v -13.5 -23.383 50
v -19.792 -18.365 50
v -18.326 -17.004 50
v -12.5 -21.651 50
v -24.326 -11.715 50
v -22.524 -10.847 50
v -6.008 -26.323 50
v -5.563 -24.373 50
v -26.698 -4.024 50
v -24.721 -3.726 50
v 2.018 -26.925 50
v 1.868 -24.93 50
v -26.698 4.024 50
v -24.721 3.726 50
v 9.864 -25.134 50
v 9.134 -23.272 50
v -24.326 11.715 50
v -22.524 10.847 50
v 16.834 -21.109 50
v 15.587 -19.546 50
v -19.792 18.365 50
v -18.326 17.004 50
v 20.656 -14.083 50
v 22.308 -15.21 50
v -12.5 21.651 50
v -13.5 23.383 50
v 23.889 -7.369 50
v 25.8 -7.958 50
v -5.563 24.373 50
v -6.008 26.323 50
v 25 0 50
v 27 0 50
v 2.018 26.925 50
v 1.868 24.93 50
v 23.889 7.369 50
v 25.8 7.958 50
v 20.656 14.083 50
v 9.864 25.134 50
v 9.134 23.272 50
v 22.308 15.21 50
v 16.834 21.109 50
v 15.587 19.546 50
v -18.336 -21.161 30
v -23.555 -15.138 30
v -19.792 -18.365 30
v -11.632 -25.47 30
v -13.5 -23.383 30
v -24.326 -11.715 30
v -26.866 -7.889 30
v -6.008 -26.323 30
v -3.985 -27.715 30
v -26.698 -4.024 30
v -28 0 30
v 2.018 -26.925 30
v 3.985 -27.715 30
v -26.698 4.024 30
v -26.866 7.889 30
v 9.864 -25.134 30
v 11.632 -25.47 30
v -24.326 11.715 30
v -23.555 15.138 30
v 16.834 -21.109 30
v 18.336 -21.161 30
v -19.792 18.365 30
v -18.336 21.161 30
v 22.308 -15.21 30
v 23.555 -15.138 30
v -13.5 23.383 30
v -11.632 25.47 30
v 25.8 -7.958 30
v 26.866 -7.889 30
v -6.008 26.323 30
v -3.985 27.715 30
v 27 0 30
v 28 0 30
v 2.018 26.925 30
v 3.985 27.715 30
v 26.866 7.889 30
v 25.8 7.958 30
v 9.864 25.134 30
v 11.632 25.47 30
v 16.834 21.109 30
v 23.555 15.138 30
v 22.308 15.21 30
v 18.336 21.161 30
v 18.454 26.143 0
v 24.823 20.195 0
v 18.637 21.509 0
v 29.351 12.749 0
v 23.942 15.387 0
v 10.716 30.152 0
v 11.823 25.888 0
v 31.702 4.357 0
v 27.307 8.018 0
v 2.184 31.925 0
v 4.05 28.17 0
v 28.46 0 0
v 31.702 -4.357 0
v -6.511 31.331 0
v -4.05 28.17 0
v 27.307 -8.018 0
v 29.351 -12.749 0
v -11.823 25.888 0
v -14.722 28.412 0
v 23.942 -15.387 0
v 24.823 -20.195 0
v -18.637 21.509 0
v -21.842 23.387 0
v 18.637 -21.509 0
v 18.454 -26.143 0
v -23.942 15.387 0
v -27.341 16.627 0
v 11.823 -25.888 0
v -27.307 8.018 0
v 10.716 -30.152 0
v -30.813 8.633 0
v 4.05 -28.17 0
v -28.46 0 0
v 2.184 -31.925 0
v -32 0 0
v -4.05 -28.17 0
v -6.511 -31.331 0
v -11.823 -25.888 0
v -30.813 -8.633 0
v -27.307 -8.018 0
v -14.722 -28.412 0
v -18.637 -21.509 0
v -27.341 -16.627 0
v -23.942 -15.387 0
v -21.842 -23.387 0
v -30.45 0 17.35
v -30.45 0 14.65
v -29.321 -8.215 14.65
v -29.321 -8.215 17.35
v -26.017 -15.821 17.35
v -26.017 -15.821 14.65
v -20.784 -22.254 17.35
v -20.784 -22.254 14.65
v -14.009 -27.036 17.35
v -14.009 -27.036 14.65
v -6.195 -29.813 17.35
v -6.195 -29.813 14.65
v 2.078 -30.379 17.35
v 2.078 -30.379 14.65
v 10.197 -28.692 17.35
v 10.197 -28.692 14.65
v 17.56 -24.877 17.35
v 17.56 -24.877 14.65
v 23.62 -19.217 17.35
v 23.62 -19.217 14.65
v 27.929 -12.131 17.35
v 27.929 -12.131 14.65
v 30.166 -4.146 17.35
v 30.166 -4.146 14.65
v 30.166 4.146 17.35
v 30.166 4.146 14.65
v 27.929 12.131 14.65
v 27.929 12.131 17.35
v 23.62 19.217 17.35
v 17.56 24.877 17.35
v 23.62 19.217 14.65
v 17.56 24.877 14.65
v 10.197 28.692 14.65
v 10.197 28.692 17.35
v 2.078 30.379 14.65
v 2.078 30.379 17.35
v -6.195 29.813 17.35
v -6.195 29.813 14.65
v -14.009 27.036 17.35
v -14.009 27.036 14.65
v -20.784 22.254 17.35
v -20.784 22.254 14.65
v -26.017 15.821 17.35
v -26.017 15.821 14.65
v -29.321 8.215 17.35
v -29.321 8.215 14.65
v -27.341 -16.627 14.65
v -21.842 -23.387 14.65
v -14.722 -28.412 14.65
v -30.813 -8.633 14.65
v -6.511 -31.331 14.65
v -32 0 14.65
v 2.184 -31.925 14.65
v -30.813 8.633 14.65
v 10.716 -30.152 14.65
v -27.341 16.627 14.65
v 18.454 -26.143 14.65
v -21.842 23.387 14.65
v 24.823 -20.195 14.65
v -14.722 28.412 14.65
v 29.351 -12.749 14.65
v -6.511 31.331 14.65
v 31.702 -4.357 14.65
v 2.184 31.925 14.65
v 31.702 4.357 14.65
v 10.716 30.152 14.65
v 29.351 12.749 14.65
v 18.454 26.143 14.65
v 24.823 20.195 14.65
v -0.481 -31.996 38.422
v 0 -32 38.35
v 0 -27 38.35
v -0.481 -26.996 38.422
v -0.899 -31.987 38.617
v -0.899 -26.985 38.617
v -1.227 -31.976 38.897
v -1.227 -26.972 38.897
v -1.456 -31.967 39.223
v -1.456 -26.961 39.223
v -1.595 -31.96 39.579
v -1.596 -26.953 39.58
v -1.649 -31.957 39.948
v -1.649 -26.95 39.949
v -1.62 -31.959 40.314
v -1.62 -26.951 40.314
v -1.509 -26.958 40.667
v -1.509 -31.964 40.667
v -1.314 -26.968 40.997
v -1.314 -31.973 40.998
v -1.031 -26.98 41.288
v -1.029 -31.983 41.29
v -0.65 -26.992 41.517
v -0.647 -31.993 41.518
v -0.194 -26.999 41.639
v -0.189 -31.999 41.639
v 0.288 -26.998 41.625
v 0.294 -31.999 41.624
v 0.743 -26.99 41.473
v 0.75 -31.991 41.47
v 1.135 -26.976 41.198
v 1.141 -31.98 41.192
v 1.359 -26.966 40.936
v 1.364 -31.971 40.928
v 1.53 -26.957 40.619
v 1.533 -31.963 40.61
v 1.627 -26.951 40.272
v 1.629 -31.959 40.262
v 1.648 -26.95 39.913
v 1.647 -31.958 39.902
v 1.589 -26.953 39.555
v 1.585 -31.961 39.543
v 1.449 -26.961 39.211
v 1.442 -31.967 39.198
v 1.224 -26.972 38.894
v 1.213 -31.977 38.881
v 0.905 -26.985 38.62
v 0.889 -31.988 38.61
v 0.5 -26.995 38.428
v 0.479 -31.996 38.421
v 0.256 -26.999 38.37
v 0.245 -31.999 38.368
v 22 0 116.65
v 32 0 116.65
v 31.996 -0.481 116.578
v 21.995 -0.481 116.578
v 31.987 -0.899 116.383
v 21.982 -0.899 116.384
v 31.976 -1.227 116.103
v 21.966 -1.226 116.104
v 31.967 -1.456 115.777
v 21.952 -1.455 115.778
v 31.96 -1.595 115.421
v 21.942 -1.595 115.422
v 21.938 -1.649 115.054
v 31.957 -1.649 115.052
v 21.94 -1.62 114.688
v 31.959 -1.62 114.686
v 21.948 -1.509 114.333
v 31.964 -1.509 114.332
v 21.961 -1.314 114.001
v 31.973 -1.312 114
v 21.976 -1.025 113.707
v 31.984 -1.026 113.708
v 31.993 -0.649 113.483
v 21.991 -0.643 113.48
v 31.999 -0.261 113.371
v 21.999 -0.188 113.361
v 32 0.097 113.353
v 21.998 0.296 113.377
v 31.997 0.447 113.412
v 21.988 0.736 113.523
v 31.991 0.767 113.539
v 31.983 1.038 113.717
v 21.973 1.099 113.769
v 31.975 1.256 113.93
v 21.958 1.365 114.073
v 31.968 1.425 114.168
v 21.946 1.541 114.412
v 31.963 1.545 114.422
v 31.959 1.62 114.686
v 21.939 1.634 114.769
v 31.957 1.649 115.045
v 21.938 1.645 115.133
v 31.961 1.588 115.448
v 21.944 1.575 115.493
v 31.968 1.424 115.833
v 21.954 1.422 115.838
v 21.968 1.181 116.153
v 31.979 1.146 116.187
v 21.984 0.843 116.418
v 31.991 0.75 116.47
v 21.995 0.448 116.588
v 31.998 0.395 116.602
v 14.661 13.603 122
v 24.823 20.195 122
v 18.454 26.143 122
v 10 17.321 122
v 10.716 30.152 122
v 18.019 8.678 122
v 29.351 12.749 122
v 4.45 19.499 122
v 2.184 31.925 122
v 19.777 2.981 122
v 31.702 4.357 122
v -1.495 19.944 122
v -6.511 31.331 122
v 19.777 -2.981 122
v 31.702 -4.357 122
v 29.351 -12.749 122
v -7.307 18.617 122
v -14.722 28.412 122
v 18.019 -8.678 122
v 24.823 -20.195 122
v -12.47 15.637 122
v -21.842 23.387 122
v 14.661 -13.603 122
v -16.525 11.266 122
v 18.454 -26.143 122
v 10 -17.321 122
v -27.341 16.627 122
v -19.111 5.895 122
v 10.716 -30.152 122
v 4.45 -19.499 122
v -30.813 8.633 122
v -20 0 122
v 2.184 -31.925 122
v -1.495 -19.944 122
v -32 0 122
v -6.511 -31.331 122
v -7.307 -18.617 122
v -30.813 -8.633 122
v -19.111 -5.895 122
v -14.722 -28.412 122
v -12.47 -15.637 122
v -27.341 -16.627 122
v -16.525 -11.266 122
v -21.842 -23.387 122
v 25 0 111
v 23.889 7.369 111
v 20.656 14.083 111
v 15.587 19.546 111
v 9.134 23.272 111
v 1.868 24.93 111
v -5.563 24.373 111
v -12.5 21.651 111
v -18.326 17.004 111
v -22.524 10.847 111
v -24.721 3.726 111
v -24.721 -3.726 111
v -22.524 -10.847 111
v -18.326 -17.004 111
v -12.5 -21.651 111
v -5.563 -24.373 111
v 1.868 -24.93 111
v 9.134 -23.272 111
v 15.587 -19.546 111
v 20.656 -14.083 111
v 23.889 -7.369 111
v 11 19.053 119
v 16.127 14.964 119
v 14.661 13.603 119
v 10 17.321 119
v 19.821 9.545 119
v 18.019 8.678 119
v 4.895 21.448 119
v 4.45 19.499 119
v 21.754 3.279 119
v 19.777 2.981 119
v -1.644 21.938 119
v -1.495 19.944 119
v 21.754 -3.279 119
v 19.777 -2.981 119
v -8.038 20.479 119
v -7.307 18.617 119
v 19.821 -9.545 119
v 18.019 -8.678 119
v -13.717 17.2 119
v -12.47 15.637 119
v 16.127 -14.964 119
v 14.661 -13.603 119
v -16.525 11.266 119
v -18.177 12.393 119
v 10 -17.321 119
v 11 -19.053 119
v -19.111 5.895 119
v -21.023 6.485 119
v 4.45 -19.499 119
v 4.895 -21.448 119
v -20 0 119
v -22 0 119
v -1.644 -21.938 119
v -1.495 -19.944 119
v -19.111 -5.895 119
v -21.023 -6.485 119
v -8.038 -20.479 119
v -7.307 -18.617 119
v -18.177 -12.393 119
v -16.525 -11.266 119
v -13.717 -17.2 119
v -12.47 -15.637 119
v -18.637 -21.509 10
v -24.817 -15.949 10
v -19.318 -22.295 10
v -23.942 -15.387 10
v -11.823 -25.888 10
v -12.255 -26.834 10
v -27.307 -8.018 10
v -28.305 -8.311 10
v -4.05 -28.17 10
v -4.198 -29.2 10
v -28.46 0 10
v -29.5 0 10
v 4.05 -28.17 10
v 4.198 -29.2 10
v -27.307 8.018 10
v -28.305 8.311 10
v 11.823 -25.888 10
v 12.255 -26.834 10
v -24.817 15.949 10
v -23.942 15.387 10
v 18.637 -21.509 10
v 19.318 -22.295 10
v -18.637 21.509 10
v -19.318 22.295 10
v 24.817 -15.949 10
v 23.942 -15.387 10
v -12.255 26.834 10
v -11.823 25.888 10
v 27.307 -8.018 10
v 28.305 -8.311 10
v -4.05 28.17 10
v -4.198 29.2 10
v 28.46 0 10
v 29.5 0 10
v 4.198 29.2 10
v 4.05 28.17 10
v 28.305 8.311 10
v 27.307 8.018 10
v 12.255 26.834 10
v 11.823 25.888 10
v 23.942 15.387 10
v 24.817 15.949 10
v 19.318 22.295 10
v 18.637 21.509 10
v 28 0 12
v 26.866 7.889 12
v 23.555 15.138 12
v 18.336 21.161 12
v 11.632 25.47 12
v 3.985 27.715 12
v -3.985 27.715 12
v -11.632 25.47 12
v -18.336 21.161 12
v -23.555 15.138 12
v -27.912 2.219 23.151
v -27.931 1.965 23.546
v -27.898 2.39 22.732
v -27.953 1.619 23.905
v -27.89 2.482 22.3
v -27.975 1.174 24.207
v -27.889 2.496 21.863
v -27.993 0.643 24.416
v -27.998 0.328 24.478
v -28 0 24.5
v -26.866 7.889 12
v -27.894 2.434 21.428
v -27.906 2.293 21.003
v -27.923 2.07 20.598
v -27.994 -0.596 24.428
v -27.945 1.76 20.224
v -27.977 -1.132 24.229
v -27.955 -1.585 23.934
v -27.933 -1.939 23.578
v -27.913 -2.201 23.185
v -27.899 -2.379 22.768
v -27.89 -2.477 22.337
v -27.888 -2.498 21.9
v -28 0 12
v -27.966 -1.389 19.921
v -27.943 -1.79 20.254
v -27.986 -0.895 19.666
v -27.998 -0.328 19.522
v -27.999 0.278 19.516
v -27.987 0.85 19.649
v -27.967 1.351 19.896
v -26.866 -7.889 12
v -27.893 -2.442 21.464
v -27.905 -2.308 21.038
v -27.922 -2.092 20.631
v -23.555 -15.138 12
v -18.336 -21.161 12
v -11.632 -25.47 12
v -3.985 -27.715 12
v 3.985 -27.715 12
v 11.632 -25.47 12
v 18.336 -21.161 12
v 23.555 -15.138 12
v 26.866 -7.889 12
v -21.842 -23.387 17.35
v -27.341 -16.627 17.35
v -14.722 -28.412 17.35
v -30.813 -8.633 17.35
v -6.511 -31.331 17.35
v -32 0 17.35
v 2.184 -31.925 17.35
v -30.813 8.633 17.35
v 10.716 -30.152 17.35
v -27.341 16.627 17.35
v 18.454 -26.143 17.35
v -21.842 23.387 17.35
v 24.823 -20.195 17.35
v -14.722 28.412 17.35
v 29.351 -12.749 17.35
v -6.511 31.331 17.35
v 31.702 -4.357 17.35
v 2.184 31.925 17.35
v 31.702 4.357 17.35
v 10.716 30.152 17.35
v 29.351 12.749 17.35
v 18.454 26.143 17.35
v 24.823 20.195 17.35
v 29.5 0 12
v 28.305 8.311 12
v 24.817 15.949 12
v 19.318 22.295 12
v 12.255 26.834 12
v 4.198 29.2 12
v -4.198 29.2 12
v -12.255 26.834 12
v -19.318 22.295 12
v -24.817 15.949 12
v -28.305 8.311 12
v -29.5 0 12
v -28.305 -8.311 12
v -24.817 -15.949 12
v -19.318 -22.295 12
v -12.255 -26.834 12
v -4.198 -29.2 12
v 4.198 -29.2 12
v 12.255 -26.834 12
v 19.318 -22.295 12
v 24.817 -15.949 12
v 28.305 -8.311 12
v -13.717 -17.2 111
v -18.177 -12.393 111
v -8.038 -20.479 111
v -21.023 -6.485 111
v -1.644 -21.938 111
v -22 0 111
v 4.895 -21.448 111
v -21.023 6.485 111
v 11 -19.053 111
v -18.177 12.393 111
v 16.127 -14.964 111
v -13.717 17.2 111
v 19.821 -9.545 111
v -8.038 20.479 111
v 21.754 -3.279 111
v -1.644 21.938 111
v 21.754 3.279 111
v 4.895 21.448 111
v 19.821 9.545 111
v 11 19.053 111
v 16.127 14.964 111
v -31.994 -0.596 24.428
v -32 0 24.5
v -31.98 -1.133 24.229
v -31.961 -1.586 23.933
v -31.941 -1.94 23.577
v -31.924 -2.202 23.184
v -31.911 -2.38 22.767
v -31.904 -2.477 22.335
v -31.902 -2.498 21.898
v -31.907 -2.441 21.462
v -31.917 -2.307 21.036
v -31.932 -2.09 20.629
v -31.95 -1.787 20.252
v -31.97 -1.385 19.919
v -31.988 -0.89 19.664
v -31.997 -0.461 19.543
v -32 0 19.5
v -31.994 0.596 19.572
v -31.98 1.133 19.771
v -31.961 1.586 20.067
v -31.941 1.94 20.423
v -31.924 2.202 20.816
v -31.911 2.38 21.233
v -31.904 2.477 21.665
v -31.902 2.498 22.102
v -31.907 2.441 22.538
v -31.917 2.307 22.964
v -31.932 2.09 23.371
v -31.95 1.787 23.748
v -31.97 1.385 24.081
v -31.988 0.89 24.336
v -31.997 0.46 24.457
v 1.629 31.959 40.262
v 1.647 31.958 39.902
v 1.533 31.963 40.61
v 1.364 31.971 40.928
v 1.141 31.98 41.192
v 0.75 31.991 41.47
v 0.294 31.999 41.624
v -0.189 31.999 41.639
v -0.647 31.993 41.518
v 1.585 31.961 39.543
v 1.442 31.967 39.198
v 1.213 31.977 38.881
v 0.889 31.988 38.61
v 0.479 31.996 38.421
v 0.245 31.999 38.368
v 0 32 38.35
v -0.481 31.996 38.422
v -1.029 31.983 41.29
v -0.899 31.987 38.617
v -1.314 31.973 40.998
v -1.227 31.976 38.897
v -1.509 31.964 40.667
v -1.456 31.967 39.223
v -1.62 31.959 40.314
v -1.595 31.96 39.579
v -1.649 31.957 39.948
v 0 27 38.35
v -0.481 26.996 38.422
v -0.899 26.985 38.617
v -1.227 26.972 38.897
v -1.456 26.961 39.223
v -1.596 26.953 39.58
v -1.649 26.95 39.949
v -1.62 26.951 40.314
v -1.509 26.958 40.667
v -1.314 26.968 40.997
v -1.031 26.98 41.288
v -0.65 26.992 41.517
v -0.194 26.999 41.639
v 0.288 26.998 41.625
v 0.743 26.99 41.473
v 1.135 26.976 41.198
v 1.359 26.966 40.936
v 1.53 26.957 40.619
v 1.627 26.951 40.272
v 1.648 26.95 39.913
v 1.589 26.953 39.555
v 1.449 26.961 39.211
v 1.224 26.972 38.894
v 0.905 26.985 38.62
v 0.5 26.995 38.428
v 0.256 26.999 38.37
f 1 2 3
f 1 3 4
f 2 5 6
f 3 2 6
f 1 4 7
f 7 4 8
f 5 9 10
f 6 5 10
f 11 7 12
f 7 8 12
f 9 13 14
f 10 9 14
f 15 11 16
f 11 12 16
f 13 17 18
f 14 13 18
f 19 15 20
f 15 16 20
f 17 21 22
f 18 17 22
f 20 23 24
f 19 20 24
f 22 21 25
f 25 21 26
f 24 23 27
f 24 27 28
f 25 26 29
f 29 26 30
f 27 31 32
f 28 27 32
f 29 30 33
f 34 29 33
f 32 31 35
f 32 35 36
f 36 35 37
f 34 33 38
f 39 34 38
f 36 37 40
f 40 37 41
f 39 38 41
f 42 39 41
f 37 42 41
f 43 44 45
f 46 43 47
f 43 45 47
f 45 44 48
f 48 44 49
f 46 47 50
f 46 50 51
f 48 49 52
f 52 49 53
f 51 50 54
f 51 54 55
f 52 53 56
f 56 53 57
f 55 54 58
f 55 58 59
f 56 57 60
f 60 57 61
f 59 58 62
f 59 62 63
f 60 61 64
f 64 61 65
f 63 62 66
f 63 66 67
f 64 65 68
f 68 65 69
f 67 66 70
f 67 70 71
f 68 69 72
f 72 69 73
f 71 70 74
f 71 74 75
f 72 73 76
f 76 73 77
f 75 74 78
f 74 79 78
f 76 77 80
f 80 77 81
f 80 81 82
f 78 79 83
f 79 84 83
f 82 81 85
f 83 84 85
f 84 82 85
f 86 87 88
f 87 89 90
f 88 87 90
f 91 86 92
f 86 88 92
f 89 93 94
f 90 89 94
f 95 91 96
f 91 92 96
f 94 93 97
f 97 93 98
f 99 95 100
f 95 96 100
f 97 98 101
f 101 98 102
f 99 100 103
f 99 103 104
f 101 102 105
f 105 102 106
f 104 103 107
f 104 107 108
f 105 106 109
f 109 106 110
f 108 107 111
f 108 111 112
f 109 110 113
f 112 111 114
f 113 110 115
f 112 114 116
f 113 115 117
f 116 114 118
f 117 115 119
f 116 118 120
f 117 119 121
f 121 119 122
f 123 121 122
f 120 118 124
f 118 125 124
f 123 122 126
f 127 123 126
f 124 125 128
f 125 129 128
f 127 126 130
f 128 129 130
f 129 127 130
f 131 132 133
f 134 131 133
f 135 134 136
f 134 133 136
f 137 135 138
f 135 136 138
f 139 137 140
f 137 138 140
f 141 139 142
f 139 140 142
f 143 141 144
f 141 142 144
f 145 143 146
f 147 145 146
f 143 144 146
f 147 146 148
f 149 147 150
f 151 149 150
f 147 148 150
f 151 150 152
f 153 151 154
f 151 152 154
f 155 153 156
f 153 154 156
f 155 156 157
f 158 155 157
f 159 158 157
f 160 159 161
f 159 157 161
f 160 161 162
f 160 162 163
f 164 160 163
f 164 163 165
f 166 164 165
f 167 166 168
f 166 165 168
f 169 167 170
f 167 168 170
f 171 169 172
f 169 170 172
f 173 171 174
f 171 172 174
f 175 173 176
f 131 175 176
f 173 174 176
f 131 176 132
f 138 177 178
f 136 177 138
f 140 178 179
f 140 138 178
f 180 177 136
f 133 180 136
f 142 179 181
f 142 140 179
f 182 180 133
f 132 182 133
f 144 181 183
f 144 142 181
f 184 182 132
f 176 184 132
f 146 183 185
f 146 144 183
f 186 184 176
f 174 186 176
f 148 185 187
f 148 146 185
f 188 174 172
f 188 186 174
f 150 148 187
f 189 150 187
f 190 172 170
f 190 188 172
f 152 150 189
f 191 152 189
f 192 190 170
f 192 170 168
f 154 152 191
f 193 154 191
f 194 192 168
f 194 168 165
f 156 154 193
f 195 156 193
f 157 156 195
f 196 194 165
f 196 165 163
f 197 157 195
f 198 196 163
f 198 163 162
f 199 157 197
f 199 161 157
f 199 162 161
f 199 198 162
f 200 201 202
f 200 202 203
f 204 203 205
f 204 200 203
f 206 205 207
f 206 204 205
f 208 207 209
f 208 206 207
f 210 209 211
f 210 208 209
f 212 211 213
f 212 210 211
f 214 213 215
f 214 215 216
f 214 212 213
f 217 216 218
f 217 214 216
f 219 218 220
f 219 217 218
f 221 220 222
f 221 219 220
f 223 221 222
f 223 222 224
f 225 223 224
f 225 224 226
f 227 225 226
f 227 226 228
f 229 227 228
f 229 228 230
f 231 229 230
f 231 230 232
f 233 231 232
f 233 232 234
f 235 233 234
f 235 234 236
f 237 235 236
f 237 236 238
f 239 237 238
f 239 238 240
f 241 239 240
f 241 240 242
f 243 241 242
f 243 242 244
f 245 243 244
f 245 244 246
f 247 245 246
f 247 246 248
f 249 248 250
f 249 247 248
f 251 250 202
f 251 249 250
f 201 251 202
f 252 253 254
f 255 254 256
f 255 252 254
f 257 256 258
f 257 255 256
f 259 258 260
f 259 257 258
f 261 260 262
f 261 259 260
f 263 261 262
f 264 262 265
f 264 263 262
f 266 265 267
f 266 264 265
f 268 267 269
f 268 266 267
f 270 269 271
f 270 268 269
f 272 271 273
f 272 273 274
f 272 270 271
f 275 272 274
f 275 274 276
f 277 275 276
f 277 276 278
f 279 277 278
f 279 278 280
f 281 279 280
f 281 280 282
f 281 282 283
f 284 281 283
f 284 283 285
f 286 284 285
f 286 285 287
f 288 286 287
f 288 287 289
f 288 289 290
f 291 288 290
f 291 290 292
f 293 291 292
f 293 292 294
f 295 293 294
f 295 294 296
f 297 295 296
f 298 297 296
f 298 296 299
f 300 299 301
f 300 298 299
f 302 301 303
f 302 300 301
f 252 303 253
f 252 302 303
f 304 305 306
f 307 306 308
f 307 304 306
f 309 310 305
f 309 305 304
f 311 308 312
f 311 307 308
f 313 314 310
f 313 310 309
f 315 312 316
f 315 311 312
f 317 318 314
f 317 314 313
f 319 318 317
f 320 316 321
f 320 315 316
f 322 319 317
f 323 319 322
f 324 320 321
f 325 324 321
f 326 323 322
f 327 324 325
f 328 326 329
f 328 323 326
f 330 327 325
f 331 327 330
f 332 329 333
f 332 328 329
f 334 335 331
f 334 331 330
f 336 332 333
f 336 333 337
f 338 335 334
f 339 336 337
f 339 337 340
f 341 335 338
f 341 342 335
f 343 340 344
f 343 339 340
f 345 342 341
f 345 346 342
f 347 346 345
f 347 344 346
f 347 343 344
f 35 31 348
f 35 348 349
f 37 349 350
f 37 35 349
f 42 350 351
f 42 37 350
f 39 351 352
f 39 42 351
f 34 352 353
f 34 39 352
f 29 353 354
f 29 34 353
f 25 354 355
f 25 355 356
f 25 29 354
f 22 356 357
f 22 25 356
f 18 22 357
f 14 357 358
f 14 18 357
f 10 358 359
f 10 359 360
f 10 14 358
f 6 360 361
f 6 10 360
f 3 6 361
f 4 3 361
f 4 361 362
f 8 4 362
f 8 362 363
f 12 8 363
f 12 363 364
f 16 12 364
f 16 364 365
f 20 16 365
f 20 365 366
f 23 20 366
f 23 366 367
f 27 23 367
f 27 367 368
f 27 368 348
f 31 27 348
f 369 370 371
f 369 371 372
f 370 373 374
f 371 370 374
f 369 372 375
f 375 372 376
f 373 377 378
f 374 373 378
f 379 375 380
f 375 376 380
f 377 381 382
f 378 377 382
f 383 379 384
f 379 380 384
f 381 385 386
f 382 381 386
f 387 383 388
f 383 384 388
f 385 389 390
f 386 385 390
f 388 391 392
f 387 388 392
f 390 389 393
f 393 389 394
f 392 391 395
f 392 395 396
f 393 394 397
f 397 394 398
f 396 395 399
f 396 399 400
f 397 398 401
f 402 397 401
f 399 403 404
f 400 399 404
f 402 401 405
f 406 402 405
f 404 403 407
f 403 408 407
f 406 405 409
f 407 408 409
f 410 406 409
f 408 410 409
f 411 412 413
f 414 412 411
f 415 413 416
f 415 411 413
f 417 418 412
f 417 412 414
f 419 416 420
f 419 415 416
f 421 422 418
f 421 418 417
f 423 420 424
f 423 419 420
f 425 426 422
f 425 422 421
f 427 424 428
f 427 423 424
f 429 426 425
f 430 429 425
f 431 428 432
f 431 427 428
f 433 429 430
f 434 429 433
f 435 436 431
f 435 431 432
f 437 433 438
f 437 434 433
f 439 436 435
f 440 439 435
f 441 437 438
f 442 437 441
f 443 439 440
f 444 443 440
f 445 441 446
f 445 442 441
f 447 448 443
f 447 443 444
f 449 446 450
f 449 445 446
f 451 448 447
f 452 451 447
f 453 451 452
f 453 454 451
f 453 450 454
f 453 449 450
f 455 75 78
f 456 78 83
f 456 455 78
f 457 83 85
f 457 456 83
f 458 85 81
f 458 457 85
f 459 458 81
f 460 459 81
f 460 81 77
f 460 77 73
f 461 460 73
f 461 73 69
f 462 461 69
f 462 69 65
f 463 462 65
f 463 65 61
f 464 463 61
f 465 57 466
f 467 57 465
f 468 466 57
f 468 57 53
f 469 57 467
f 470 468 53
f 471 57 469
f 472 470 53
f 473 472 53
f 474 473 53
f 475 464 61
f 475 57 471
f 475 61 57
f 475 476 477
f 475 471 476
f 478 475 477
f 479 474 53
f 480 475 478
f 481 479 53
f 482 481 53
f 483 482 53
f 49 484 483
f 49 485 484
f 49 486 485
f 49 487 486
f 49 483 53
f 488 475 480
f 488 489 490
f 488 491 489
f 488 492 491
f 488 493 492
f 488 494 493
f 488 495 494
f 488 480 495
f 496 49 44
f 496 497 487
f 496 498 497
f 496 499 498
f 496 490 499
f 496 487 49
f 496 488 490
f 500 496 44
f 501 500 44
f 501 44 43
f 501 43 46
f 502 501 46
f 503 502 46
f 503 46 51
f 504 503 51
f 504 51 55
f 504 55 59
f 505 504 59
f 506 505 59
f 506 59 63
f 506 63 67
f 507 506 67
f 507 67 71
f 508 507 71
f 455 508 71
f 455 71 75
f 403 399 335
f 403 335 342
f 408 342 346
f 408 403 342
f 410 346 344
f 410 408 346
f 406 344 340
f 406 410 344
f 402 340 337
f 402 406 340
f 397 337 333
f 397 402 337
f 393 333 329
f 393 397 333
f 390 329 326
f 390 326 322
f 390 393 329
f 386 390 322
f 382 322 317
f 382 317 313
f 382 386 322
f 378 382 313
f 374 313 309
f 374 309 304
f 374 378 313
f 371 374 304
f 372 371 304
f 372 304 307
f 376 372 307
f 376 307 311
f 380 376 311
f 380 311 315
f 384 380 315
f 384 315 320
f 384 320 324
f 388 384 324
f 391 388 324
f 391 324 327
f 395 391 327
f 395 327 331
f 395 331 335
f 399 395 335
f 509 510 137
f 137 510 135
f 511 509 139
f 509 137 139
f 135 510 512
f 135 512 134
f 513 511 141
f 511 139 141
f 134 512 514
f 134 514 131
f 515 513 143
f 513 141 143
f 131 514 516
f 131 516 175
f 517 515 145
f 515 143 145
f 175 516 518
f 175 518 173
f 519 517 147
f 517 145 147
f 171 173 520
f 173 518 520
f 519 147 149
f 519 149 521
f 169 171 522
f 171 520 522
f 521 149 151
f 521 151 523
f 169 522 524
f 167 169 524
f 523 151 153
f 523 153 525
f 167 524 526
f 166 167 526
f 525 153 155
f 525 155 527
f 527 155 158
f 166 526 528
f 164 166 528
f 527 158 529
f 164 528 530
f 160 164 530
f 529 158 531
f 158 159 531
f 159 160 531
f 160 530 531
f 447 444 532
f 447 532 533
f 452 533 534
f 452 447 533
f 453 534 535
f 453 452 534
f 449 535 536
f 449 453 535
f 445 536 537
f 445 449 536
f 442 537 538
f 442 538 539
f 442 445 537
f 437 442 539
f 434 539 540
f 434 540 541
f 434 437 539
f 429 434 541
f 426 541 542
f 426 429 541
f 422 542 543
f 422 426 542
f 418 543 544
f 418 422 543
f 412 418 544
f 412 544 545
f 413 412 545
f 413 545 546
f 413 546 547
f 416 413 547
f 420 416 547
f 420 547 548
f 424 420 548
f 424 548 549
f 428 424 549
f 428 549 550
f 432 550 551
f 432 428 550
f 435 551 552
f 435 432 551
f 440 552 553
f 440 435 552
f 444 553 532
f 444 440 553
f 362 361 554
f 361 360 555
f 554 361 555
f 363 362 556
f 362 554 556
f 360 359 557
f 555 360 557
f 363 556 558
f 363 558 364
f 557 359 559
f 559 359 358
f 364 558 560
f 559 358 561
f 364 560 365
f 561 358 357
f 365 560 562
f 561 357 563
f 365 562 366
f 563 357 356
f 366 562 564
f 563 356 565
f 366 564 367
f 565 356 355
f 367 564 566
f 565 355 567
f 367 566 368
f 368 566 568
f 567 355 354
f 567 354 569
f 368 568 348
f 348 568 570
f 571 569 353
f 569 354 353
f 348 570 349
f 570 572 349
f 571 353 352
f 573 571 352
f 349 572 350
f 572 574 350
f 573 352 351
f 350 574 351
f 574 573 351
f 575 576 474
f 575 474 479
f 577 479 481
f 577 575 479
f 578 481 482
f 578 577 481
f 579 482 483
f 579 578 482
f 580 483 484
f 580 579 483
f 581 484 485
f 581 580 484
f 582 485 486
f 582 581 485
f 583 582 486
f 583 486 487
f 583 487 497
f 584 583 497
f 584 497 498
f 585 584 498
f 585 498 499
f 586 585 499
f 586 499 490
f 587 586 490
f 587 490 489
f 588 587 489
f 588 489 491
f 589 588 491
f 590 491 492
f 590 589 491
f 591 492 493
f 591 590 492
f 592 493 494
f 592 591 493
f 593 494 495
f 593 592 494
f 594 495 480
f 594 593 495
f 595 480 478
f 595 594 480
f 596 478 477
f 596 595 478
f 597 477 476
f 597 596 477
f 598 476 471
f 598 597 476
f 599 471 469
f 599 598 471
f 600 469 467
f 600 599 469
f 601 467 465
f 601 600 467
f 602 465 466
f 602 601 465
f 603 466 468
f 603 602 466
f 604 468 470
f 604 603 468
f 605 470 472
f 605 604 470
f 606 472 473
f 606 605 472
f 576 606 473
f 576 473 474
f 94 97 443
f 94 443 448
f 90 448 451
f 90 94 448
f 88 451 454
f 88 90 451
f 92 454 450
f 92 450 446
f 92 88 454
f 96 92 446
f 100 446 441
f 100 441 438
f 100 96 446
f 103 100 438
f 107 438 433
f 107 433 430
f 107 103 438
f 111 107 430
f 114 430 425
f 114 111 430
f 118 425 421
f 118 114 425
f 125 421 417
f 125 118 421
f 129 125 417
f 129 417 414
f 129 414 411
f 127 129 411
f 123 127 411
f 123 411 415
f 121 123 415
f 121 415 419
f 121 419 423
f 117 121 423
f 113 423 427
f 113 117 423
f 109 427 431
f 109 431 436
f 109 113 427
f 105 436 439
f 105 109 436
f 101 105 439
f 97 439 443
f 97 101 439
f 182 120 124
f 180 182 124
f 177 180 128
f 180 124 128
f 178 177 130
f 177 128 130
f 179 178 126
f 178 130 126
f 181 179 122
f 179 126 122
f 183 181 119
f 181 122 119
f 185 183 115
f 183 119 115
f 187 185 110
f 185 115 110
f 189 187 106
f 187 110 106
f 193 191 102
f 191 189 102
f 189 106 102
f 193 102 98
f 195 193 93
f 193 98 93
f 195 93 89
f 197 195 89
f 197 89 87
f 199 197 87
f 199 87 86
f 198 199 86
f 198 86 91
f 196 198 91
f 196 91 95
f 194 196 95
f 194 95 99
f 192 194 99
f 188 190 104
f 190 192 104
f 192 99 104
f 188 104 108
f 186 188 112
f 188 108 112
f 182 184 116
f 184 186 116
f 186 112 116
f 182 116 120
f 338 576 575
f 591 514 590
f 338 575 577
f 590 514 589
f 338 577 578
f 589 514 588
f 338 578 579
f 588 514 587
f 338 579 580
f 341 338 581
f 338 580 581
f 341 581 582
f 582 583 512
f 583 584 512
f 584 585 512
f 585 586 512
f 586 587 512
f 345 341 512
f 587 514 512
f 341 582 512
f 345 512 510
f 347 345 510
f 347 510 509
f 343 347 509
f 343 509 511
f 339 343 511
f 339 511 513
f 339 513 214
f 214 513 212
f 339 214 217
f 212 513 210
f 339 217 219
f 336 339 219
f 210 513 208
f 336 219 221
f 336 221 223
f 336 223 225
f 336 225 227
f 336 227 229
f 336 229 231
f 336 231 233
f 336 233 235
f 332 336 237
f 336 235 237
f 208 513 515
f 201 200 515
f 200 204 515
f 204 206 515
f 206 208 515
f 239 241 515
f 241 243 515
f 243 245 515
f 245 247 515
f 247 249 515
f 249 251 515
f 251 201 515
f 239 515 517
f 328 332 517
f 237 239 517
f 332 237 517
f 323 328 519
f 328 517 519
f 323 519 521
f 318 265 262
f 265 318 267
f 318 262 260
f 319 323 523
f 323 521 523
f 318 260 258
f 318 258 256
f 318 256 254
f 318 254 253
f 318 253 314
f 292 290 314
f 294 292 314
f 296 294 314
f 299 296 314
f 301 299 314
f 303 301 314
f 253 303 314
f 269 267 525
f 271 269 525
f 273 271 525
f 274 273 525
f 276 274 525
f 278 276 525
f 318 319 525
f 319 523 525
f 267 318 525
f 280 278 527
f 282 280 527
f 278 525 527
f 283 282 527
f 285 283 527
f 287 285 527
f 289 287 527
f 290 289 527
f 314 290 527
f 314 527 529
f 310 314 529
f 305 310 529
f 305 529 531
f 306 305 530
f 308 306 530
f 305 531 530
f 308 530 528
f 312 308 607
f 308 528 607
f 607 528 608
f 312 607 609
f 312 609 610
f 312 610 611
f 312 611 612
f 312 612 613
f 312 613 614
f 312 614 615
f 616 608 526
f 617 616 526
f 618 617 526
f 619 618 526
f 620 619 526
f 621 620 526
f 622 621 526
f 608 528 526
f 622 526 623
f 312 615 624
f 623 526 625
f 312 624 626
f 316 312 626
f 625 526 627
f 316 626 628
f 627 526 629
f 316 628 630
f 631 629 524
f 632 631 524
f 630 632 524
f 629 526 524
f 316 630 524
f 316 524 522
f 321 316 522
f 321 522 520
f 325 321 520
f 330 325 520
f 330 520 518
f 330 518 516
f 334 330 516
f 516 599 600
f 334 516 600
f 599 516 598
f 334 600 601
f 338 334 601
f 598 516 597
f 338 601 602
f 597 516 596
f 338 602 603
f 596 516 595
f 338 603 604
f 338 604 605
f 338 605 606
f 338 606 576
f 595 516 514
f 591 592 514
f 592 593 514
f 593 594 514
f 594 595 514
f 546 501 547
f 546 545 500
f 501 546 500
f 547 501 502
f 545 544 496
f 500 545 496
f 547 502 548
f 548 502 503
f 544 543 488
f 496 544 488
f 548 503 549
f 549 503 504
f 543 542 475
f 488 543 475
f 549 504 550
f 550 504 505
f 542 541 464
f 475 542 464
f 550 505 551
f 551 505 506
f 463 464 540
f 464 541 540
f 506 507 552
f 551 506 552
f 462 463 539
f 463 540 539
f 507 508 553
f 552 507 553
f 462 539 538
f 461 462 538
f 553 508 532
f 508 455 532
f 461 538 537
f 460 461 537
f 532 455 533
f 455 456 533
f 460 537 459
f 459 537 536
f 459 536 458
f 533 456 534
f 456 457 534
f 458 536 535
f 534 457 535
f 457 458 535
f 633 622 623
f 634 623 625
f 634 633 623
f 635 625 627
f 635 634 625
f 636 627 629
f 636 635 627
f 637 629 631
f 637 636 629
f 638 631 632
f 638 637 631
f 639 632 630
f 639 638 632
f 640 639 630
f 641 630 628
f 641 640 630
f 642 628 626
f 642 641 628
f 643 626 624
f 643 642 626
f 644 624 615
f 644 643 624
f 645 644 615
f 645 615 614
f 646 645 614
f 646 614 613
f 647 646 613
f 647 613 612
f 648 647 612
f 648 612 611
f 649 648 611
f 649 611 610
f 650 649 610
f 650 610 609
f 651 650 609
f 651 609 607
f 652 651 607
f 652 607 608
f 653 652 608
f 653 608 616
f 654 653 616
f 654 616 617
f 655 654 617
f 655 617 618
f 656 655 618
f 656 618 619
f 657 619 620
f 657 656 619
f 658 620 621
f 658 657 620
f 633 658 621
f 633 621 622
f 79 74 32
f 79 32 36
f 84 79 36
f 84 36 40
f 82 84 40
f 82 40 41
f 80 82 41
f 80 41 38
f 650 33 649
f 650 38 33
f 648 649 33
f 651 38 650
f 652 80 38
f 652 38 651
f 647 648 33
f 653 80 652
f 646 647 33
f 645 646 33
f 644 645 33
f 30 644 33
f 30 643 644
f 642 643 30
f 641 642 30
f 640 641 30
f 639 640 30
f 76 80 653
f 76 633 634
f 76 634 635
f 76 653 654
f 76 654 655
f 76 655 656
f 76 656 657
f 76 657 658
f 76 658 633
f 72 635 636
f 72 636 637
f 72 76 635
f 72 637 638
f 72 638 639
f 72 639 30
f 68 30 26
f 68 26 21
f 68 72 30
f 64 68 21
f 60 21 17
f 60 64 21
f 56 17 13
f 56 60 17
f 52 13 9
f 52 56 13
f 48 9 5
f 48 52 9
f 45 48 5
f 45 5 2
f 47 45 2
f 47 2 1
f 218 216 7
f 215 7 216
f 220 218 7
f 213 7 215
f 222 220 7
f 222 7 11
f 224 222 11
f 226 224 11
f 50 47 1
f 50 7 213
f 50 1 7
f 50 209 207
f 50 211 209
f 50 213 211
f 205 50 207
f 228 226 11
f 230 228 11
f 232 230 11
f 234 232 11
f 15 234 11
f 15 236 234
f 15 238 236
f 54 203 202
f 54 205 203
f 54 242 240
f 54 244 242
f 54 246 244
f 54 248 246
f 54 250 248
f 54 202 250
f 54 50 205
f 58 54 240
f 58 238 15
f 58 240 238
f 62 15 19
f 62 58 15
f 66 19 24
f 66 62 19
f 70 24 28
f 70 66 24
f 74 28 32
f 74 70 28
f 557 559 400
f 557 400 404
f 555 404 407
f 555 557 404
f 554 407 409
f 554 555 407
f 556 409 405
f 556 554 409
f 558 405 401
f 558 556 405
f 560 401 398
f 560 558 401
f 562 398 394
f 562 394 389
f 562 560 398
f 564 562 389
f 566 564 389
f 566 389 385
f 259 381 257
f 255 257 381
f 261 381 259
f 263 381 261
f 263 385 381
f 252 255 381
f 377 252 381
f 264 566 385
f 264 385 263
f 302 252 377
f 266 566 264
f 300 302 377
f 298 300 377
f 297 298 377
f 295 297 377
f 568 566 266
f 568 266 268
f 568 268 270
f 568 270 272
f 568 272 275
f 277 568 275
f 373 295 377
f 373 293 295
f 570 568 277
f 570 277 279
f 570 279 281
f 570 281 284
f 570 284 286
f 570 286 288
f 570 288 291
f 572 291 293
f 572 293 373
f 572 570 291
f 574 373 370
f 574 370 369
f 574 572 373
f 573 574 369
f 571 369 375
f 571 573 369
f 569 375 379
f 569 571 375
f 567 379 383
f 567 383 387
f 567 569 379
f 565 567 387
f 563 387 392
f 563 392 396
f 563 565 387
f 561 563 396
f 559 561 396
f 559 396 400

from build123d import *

# Parameters (mm, degrees)
SKETCH1_R            = 32
BODY_DEPTH           = 122
SKETCH2_R            = 20
LIP_BORE_DEPTH       = 122
SKETCH3_R            = 22
BRIDGE_SEAT_DEPTH    = 119
SKETCH4_R            = 25
HOPPER_DEPTH         = 111
SKETCH5_R            = 27
BURR_SEAT_DEPTH      = 50
SKETCH6_R            = 28
PILOT_SEAT_DEPTH     = 30
SKETCH7_R            = 28.46
THREAD_MINOR_DEPTH   = 10
SKETCH8_R            = 29.5
THREAD_RELIEF_DEPTH  = 2
SKETCH9_R            = 33
SKETCH9_R_2          = 30.45
ORING_GROOVE_DEPTH   = 2.7
SKETCH10_R           = 1.65
BURR_SCREW_90_DEPTH  = 6
SKETCH11_R           = 1.65
BURR_SCREW_270_DEPTH = 6
SKETCH12_R           = 1.65
BRIDGE_SCREW_DEPTH   = 11
SKETCH13_R           = 2.5
PLUNGER_HOLE_DEPTH   = 5


with BuildPart() as part:
    # Sketch1 → Body (new body)
    with BuildSketch(Plane.XY):
        with Locations(Location((0, 0, 0), (0, 0, 180))):
            Circle(SKETCH1_R)
    extrude(amount=BODY_DEPTH)

    # Sketch2 → Lip_bore (cut)
    with BuildSketch(Plane.XY):
        with Locations(Location((0, 0, 0), (0, 0, 180))):
            Circle(SKETCH2_R)
    extrude(amount=LIP_BORE_DEPTH, mode=Mode.SUBTRACT)

    # Sketch3 → Bridge_seat (cut)
    with BuildSketch(Plane.XY):
        with Locations(Location((0, 0, 0), (0, 0, 180))):
            Circle(SKETCH3_R)
    extrude(amount=BRIDGE_SEAT_DEPTH, mode=Mode.SUBTRACT)

    # Sketch4 → Hopper (cut)
    with BuildSketch(Plane.XY):
        Circle(SKETCH4_R)
    extrude(amount=HOPPER_DEPTH, mode=Mode.SUBTRACT)

    # Sketch5 → Burr_seat (cut)
    with BuildSketch(Plane.XY):
        Circle(SKETCH5_R)
    extrude(amount=BURR_SEAT_DEPTH, mode=Mode.SUBTRACT)

    # Sketch6 → Pilot_seat (cut)
    with BuildSketch(Plane.XY):
        Circle(SKETCH6_R)
    extrude(amount=PILOT_SEAT_DEPTH, mode=Mode.SUBTRACT)

    # Sketch7 → Thread_minor (cut)
    with BuildSketch(Plane.XY):
        Circle(SKETCH7_R)
    extrude(amount=THREAD_MINOR_DEPTH, mode=Mode.SUBTRACT)

    # Sketch8 → Thread_relief (cut)
    with BuildSketch(Plane.XY.offset(10)):
        Circle(SKETCH8_R)
    extrude(amount=THREAD_RELIEF_DEPTH, mode=Mode.SUBTRACT)

    # Sketch9 → Oring_groove (cut)
    with BuildSketch(Plane.XY.offset(14.65)):
        Circle(SKETCH9_R)
        with Locations(Location((0, 0, 0), (0, 0, 180))):
            Circle(SKETCH9_R_2, mode=Mode.SUBTRACT)
    extrude(amount=ORING_GROOVE_DEPTH, mode=Mode.SUBTRACT)

    # Sketch10 → Burr_screw_90 (cut)
    with BuildSketch(Plane(origin=(0, 26.5, 0), x_dir=(1, 0, 0), z_dir=(0, 1, 0))):
        with Locations(Location((0, -40, 0), (0, 0, 90))):
            Circle(SKETCH10_R)
    extrude(amount=BURR_SCREW_90_DEPTH, mode=Mode.SUBTRACT)

    # Sketch11 → Burr_screw_270 (cut)
    with BuildSketch(Plane(origin=(0, -32.5, 0), x_dir=(1, 0, 0), z_dir=(0, 1, 0))):
        with Locations(Location((0, -40, 0), (0, 0, 90))):
            Circle(SKETCH11_R)
    extrude(amount=BURR_SCREW_270_DEPTH, mode=Mode.SUBTRACT)

    # Sketch12 → Bridge_screw (cut)
    with BuildSketch(Plane(origin=(21.5, 0, 0), x_dir=(0, 0, -1), z_dir=(1, 0, 0))):
        with Locations(Location((-115, 0, 0), (0, 0, 180))):
            Circle(SKETCH12_R)
    extrude(amount=BRIDGE_SCREW_DEPTH, mode=Mode.SUBTRACT)

    # Sketch13 → Plunger_hole (cut)
    with BuildSketch(Plane(origin=(-32.5, 0, 0), x_dir=(0, 0, -1), z_dir=(1, 0, 0))):
        with Locations(Location((-22, 0, 0), (0, 0, 180))):
            Circle(SKETCH13_R)
    extrude(amount=PLUNGER_HOLE_DEPTH, mode=Mode.SUBTRACT)


solid = part.part
